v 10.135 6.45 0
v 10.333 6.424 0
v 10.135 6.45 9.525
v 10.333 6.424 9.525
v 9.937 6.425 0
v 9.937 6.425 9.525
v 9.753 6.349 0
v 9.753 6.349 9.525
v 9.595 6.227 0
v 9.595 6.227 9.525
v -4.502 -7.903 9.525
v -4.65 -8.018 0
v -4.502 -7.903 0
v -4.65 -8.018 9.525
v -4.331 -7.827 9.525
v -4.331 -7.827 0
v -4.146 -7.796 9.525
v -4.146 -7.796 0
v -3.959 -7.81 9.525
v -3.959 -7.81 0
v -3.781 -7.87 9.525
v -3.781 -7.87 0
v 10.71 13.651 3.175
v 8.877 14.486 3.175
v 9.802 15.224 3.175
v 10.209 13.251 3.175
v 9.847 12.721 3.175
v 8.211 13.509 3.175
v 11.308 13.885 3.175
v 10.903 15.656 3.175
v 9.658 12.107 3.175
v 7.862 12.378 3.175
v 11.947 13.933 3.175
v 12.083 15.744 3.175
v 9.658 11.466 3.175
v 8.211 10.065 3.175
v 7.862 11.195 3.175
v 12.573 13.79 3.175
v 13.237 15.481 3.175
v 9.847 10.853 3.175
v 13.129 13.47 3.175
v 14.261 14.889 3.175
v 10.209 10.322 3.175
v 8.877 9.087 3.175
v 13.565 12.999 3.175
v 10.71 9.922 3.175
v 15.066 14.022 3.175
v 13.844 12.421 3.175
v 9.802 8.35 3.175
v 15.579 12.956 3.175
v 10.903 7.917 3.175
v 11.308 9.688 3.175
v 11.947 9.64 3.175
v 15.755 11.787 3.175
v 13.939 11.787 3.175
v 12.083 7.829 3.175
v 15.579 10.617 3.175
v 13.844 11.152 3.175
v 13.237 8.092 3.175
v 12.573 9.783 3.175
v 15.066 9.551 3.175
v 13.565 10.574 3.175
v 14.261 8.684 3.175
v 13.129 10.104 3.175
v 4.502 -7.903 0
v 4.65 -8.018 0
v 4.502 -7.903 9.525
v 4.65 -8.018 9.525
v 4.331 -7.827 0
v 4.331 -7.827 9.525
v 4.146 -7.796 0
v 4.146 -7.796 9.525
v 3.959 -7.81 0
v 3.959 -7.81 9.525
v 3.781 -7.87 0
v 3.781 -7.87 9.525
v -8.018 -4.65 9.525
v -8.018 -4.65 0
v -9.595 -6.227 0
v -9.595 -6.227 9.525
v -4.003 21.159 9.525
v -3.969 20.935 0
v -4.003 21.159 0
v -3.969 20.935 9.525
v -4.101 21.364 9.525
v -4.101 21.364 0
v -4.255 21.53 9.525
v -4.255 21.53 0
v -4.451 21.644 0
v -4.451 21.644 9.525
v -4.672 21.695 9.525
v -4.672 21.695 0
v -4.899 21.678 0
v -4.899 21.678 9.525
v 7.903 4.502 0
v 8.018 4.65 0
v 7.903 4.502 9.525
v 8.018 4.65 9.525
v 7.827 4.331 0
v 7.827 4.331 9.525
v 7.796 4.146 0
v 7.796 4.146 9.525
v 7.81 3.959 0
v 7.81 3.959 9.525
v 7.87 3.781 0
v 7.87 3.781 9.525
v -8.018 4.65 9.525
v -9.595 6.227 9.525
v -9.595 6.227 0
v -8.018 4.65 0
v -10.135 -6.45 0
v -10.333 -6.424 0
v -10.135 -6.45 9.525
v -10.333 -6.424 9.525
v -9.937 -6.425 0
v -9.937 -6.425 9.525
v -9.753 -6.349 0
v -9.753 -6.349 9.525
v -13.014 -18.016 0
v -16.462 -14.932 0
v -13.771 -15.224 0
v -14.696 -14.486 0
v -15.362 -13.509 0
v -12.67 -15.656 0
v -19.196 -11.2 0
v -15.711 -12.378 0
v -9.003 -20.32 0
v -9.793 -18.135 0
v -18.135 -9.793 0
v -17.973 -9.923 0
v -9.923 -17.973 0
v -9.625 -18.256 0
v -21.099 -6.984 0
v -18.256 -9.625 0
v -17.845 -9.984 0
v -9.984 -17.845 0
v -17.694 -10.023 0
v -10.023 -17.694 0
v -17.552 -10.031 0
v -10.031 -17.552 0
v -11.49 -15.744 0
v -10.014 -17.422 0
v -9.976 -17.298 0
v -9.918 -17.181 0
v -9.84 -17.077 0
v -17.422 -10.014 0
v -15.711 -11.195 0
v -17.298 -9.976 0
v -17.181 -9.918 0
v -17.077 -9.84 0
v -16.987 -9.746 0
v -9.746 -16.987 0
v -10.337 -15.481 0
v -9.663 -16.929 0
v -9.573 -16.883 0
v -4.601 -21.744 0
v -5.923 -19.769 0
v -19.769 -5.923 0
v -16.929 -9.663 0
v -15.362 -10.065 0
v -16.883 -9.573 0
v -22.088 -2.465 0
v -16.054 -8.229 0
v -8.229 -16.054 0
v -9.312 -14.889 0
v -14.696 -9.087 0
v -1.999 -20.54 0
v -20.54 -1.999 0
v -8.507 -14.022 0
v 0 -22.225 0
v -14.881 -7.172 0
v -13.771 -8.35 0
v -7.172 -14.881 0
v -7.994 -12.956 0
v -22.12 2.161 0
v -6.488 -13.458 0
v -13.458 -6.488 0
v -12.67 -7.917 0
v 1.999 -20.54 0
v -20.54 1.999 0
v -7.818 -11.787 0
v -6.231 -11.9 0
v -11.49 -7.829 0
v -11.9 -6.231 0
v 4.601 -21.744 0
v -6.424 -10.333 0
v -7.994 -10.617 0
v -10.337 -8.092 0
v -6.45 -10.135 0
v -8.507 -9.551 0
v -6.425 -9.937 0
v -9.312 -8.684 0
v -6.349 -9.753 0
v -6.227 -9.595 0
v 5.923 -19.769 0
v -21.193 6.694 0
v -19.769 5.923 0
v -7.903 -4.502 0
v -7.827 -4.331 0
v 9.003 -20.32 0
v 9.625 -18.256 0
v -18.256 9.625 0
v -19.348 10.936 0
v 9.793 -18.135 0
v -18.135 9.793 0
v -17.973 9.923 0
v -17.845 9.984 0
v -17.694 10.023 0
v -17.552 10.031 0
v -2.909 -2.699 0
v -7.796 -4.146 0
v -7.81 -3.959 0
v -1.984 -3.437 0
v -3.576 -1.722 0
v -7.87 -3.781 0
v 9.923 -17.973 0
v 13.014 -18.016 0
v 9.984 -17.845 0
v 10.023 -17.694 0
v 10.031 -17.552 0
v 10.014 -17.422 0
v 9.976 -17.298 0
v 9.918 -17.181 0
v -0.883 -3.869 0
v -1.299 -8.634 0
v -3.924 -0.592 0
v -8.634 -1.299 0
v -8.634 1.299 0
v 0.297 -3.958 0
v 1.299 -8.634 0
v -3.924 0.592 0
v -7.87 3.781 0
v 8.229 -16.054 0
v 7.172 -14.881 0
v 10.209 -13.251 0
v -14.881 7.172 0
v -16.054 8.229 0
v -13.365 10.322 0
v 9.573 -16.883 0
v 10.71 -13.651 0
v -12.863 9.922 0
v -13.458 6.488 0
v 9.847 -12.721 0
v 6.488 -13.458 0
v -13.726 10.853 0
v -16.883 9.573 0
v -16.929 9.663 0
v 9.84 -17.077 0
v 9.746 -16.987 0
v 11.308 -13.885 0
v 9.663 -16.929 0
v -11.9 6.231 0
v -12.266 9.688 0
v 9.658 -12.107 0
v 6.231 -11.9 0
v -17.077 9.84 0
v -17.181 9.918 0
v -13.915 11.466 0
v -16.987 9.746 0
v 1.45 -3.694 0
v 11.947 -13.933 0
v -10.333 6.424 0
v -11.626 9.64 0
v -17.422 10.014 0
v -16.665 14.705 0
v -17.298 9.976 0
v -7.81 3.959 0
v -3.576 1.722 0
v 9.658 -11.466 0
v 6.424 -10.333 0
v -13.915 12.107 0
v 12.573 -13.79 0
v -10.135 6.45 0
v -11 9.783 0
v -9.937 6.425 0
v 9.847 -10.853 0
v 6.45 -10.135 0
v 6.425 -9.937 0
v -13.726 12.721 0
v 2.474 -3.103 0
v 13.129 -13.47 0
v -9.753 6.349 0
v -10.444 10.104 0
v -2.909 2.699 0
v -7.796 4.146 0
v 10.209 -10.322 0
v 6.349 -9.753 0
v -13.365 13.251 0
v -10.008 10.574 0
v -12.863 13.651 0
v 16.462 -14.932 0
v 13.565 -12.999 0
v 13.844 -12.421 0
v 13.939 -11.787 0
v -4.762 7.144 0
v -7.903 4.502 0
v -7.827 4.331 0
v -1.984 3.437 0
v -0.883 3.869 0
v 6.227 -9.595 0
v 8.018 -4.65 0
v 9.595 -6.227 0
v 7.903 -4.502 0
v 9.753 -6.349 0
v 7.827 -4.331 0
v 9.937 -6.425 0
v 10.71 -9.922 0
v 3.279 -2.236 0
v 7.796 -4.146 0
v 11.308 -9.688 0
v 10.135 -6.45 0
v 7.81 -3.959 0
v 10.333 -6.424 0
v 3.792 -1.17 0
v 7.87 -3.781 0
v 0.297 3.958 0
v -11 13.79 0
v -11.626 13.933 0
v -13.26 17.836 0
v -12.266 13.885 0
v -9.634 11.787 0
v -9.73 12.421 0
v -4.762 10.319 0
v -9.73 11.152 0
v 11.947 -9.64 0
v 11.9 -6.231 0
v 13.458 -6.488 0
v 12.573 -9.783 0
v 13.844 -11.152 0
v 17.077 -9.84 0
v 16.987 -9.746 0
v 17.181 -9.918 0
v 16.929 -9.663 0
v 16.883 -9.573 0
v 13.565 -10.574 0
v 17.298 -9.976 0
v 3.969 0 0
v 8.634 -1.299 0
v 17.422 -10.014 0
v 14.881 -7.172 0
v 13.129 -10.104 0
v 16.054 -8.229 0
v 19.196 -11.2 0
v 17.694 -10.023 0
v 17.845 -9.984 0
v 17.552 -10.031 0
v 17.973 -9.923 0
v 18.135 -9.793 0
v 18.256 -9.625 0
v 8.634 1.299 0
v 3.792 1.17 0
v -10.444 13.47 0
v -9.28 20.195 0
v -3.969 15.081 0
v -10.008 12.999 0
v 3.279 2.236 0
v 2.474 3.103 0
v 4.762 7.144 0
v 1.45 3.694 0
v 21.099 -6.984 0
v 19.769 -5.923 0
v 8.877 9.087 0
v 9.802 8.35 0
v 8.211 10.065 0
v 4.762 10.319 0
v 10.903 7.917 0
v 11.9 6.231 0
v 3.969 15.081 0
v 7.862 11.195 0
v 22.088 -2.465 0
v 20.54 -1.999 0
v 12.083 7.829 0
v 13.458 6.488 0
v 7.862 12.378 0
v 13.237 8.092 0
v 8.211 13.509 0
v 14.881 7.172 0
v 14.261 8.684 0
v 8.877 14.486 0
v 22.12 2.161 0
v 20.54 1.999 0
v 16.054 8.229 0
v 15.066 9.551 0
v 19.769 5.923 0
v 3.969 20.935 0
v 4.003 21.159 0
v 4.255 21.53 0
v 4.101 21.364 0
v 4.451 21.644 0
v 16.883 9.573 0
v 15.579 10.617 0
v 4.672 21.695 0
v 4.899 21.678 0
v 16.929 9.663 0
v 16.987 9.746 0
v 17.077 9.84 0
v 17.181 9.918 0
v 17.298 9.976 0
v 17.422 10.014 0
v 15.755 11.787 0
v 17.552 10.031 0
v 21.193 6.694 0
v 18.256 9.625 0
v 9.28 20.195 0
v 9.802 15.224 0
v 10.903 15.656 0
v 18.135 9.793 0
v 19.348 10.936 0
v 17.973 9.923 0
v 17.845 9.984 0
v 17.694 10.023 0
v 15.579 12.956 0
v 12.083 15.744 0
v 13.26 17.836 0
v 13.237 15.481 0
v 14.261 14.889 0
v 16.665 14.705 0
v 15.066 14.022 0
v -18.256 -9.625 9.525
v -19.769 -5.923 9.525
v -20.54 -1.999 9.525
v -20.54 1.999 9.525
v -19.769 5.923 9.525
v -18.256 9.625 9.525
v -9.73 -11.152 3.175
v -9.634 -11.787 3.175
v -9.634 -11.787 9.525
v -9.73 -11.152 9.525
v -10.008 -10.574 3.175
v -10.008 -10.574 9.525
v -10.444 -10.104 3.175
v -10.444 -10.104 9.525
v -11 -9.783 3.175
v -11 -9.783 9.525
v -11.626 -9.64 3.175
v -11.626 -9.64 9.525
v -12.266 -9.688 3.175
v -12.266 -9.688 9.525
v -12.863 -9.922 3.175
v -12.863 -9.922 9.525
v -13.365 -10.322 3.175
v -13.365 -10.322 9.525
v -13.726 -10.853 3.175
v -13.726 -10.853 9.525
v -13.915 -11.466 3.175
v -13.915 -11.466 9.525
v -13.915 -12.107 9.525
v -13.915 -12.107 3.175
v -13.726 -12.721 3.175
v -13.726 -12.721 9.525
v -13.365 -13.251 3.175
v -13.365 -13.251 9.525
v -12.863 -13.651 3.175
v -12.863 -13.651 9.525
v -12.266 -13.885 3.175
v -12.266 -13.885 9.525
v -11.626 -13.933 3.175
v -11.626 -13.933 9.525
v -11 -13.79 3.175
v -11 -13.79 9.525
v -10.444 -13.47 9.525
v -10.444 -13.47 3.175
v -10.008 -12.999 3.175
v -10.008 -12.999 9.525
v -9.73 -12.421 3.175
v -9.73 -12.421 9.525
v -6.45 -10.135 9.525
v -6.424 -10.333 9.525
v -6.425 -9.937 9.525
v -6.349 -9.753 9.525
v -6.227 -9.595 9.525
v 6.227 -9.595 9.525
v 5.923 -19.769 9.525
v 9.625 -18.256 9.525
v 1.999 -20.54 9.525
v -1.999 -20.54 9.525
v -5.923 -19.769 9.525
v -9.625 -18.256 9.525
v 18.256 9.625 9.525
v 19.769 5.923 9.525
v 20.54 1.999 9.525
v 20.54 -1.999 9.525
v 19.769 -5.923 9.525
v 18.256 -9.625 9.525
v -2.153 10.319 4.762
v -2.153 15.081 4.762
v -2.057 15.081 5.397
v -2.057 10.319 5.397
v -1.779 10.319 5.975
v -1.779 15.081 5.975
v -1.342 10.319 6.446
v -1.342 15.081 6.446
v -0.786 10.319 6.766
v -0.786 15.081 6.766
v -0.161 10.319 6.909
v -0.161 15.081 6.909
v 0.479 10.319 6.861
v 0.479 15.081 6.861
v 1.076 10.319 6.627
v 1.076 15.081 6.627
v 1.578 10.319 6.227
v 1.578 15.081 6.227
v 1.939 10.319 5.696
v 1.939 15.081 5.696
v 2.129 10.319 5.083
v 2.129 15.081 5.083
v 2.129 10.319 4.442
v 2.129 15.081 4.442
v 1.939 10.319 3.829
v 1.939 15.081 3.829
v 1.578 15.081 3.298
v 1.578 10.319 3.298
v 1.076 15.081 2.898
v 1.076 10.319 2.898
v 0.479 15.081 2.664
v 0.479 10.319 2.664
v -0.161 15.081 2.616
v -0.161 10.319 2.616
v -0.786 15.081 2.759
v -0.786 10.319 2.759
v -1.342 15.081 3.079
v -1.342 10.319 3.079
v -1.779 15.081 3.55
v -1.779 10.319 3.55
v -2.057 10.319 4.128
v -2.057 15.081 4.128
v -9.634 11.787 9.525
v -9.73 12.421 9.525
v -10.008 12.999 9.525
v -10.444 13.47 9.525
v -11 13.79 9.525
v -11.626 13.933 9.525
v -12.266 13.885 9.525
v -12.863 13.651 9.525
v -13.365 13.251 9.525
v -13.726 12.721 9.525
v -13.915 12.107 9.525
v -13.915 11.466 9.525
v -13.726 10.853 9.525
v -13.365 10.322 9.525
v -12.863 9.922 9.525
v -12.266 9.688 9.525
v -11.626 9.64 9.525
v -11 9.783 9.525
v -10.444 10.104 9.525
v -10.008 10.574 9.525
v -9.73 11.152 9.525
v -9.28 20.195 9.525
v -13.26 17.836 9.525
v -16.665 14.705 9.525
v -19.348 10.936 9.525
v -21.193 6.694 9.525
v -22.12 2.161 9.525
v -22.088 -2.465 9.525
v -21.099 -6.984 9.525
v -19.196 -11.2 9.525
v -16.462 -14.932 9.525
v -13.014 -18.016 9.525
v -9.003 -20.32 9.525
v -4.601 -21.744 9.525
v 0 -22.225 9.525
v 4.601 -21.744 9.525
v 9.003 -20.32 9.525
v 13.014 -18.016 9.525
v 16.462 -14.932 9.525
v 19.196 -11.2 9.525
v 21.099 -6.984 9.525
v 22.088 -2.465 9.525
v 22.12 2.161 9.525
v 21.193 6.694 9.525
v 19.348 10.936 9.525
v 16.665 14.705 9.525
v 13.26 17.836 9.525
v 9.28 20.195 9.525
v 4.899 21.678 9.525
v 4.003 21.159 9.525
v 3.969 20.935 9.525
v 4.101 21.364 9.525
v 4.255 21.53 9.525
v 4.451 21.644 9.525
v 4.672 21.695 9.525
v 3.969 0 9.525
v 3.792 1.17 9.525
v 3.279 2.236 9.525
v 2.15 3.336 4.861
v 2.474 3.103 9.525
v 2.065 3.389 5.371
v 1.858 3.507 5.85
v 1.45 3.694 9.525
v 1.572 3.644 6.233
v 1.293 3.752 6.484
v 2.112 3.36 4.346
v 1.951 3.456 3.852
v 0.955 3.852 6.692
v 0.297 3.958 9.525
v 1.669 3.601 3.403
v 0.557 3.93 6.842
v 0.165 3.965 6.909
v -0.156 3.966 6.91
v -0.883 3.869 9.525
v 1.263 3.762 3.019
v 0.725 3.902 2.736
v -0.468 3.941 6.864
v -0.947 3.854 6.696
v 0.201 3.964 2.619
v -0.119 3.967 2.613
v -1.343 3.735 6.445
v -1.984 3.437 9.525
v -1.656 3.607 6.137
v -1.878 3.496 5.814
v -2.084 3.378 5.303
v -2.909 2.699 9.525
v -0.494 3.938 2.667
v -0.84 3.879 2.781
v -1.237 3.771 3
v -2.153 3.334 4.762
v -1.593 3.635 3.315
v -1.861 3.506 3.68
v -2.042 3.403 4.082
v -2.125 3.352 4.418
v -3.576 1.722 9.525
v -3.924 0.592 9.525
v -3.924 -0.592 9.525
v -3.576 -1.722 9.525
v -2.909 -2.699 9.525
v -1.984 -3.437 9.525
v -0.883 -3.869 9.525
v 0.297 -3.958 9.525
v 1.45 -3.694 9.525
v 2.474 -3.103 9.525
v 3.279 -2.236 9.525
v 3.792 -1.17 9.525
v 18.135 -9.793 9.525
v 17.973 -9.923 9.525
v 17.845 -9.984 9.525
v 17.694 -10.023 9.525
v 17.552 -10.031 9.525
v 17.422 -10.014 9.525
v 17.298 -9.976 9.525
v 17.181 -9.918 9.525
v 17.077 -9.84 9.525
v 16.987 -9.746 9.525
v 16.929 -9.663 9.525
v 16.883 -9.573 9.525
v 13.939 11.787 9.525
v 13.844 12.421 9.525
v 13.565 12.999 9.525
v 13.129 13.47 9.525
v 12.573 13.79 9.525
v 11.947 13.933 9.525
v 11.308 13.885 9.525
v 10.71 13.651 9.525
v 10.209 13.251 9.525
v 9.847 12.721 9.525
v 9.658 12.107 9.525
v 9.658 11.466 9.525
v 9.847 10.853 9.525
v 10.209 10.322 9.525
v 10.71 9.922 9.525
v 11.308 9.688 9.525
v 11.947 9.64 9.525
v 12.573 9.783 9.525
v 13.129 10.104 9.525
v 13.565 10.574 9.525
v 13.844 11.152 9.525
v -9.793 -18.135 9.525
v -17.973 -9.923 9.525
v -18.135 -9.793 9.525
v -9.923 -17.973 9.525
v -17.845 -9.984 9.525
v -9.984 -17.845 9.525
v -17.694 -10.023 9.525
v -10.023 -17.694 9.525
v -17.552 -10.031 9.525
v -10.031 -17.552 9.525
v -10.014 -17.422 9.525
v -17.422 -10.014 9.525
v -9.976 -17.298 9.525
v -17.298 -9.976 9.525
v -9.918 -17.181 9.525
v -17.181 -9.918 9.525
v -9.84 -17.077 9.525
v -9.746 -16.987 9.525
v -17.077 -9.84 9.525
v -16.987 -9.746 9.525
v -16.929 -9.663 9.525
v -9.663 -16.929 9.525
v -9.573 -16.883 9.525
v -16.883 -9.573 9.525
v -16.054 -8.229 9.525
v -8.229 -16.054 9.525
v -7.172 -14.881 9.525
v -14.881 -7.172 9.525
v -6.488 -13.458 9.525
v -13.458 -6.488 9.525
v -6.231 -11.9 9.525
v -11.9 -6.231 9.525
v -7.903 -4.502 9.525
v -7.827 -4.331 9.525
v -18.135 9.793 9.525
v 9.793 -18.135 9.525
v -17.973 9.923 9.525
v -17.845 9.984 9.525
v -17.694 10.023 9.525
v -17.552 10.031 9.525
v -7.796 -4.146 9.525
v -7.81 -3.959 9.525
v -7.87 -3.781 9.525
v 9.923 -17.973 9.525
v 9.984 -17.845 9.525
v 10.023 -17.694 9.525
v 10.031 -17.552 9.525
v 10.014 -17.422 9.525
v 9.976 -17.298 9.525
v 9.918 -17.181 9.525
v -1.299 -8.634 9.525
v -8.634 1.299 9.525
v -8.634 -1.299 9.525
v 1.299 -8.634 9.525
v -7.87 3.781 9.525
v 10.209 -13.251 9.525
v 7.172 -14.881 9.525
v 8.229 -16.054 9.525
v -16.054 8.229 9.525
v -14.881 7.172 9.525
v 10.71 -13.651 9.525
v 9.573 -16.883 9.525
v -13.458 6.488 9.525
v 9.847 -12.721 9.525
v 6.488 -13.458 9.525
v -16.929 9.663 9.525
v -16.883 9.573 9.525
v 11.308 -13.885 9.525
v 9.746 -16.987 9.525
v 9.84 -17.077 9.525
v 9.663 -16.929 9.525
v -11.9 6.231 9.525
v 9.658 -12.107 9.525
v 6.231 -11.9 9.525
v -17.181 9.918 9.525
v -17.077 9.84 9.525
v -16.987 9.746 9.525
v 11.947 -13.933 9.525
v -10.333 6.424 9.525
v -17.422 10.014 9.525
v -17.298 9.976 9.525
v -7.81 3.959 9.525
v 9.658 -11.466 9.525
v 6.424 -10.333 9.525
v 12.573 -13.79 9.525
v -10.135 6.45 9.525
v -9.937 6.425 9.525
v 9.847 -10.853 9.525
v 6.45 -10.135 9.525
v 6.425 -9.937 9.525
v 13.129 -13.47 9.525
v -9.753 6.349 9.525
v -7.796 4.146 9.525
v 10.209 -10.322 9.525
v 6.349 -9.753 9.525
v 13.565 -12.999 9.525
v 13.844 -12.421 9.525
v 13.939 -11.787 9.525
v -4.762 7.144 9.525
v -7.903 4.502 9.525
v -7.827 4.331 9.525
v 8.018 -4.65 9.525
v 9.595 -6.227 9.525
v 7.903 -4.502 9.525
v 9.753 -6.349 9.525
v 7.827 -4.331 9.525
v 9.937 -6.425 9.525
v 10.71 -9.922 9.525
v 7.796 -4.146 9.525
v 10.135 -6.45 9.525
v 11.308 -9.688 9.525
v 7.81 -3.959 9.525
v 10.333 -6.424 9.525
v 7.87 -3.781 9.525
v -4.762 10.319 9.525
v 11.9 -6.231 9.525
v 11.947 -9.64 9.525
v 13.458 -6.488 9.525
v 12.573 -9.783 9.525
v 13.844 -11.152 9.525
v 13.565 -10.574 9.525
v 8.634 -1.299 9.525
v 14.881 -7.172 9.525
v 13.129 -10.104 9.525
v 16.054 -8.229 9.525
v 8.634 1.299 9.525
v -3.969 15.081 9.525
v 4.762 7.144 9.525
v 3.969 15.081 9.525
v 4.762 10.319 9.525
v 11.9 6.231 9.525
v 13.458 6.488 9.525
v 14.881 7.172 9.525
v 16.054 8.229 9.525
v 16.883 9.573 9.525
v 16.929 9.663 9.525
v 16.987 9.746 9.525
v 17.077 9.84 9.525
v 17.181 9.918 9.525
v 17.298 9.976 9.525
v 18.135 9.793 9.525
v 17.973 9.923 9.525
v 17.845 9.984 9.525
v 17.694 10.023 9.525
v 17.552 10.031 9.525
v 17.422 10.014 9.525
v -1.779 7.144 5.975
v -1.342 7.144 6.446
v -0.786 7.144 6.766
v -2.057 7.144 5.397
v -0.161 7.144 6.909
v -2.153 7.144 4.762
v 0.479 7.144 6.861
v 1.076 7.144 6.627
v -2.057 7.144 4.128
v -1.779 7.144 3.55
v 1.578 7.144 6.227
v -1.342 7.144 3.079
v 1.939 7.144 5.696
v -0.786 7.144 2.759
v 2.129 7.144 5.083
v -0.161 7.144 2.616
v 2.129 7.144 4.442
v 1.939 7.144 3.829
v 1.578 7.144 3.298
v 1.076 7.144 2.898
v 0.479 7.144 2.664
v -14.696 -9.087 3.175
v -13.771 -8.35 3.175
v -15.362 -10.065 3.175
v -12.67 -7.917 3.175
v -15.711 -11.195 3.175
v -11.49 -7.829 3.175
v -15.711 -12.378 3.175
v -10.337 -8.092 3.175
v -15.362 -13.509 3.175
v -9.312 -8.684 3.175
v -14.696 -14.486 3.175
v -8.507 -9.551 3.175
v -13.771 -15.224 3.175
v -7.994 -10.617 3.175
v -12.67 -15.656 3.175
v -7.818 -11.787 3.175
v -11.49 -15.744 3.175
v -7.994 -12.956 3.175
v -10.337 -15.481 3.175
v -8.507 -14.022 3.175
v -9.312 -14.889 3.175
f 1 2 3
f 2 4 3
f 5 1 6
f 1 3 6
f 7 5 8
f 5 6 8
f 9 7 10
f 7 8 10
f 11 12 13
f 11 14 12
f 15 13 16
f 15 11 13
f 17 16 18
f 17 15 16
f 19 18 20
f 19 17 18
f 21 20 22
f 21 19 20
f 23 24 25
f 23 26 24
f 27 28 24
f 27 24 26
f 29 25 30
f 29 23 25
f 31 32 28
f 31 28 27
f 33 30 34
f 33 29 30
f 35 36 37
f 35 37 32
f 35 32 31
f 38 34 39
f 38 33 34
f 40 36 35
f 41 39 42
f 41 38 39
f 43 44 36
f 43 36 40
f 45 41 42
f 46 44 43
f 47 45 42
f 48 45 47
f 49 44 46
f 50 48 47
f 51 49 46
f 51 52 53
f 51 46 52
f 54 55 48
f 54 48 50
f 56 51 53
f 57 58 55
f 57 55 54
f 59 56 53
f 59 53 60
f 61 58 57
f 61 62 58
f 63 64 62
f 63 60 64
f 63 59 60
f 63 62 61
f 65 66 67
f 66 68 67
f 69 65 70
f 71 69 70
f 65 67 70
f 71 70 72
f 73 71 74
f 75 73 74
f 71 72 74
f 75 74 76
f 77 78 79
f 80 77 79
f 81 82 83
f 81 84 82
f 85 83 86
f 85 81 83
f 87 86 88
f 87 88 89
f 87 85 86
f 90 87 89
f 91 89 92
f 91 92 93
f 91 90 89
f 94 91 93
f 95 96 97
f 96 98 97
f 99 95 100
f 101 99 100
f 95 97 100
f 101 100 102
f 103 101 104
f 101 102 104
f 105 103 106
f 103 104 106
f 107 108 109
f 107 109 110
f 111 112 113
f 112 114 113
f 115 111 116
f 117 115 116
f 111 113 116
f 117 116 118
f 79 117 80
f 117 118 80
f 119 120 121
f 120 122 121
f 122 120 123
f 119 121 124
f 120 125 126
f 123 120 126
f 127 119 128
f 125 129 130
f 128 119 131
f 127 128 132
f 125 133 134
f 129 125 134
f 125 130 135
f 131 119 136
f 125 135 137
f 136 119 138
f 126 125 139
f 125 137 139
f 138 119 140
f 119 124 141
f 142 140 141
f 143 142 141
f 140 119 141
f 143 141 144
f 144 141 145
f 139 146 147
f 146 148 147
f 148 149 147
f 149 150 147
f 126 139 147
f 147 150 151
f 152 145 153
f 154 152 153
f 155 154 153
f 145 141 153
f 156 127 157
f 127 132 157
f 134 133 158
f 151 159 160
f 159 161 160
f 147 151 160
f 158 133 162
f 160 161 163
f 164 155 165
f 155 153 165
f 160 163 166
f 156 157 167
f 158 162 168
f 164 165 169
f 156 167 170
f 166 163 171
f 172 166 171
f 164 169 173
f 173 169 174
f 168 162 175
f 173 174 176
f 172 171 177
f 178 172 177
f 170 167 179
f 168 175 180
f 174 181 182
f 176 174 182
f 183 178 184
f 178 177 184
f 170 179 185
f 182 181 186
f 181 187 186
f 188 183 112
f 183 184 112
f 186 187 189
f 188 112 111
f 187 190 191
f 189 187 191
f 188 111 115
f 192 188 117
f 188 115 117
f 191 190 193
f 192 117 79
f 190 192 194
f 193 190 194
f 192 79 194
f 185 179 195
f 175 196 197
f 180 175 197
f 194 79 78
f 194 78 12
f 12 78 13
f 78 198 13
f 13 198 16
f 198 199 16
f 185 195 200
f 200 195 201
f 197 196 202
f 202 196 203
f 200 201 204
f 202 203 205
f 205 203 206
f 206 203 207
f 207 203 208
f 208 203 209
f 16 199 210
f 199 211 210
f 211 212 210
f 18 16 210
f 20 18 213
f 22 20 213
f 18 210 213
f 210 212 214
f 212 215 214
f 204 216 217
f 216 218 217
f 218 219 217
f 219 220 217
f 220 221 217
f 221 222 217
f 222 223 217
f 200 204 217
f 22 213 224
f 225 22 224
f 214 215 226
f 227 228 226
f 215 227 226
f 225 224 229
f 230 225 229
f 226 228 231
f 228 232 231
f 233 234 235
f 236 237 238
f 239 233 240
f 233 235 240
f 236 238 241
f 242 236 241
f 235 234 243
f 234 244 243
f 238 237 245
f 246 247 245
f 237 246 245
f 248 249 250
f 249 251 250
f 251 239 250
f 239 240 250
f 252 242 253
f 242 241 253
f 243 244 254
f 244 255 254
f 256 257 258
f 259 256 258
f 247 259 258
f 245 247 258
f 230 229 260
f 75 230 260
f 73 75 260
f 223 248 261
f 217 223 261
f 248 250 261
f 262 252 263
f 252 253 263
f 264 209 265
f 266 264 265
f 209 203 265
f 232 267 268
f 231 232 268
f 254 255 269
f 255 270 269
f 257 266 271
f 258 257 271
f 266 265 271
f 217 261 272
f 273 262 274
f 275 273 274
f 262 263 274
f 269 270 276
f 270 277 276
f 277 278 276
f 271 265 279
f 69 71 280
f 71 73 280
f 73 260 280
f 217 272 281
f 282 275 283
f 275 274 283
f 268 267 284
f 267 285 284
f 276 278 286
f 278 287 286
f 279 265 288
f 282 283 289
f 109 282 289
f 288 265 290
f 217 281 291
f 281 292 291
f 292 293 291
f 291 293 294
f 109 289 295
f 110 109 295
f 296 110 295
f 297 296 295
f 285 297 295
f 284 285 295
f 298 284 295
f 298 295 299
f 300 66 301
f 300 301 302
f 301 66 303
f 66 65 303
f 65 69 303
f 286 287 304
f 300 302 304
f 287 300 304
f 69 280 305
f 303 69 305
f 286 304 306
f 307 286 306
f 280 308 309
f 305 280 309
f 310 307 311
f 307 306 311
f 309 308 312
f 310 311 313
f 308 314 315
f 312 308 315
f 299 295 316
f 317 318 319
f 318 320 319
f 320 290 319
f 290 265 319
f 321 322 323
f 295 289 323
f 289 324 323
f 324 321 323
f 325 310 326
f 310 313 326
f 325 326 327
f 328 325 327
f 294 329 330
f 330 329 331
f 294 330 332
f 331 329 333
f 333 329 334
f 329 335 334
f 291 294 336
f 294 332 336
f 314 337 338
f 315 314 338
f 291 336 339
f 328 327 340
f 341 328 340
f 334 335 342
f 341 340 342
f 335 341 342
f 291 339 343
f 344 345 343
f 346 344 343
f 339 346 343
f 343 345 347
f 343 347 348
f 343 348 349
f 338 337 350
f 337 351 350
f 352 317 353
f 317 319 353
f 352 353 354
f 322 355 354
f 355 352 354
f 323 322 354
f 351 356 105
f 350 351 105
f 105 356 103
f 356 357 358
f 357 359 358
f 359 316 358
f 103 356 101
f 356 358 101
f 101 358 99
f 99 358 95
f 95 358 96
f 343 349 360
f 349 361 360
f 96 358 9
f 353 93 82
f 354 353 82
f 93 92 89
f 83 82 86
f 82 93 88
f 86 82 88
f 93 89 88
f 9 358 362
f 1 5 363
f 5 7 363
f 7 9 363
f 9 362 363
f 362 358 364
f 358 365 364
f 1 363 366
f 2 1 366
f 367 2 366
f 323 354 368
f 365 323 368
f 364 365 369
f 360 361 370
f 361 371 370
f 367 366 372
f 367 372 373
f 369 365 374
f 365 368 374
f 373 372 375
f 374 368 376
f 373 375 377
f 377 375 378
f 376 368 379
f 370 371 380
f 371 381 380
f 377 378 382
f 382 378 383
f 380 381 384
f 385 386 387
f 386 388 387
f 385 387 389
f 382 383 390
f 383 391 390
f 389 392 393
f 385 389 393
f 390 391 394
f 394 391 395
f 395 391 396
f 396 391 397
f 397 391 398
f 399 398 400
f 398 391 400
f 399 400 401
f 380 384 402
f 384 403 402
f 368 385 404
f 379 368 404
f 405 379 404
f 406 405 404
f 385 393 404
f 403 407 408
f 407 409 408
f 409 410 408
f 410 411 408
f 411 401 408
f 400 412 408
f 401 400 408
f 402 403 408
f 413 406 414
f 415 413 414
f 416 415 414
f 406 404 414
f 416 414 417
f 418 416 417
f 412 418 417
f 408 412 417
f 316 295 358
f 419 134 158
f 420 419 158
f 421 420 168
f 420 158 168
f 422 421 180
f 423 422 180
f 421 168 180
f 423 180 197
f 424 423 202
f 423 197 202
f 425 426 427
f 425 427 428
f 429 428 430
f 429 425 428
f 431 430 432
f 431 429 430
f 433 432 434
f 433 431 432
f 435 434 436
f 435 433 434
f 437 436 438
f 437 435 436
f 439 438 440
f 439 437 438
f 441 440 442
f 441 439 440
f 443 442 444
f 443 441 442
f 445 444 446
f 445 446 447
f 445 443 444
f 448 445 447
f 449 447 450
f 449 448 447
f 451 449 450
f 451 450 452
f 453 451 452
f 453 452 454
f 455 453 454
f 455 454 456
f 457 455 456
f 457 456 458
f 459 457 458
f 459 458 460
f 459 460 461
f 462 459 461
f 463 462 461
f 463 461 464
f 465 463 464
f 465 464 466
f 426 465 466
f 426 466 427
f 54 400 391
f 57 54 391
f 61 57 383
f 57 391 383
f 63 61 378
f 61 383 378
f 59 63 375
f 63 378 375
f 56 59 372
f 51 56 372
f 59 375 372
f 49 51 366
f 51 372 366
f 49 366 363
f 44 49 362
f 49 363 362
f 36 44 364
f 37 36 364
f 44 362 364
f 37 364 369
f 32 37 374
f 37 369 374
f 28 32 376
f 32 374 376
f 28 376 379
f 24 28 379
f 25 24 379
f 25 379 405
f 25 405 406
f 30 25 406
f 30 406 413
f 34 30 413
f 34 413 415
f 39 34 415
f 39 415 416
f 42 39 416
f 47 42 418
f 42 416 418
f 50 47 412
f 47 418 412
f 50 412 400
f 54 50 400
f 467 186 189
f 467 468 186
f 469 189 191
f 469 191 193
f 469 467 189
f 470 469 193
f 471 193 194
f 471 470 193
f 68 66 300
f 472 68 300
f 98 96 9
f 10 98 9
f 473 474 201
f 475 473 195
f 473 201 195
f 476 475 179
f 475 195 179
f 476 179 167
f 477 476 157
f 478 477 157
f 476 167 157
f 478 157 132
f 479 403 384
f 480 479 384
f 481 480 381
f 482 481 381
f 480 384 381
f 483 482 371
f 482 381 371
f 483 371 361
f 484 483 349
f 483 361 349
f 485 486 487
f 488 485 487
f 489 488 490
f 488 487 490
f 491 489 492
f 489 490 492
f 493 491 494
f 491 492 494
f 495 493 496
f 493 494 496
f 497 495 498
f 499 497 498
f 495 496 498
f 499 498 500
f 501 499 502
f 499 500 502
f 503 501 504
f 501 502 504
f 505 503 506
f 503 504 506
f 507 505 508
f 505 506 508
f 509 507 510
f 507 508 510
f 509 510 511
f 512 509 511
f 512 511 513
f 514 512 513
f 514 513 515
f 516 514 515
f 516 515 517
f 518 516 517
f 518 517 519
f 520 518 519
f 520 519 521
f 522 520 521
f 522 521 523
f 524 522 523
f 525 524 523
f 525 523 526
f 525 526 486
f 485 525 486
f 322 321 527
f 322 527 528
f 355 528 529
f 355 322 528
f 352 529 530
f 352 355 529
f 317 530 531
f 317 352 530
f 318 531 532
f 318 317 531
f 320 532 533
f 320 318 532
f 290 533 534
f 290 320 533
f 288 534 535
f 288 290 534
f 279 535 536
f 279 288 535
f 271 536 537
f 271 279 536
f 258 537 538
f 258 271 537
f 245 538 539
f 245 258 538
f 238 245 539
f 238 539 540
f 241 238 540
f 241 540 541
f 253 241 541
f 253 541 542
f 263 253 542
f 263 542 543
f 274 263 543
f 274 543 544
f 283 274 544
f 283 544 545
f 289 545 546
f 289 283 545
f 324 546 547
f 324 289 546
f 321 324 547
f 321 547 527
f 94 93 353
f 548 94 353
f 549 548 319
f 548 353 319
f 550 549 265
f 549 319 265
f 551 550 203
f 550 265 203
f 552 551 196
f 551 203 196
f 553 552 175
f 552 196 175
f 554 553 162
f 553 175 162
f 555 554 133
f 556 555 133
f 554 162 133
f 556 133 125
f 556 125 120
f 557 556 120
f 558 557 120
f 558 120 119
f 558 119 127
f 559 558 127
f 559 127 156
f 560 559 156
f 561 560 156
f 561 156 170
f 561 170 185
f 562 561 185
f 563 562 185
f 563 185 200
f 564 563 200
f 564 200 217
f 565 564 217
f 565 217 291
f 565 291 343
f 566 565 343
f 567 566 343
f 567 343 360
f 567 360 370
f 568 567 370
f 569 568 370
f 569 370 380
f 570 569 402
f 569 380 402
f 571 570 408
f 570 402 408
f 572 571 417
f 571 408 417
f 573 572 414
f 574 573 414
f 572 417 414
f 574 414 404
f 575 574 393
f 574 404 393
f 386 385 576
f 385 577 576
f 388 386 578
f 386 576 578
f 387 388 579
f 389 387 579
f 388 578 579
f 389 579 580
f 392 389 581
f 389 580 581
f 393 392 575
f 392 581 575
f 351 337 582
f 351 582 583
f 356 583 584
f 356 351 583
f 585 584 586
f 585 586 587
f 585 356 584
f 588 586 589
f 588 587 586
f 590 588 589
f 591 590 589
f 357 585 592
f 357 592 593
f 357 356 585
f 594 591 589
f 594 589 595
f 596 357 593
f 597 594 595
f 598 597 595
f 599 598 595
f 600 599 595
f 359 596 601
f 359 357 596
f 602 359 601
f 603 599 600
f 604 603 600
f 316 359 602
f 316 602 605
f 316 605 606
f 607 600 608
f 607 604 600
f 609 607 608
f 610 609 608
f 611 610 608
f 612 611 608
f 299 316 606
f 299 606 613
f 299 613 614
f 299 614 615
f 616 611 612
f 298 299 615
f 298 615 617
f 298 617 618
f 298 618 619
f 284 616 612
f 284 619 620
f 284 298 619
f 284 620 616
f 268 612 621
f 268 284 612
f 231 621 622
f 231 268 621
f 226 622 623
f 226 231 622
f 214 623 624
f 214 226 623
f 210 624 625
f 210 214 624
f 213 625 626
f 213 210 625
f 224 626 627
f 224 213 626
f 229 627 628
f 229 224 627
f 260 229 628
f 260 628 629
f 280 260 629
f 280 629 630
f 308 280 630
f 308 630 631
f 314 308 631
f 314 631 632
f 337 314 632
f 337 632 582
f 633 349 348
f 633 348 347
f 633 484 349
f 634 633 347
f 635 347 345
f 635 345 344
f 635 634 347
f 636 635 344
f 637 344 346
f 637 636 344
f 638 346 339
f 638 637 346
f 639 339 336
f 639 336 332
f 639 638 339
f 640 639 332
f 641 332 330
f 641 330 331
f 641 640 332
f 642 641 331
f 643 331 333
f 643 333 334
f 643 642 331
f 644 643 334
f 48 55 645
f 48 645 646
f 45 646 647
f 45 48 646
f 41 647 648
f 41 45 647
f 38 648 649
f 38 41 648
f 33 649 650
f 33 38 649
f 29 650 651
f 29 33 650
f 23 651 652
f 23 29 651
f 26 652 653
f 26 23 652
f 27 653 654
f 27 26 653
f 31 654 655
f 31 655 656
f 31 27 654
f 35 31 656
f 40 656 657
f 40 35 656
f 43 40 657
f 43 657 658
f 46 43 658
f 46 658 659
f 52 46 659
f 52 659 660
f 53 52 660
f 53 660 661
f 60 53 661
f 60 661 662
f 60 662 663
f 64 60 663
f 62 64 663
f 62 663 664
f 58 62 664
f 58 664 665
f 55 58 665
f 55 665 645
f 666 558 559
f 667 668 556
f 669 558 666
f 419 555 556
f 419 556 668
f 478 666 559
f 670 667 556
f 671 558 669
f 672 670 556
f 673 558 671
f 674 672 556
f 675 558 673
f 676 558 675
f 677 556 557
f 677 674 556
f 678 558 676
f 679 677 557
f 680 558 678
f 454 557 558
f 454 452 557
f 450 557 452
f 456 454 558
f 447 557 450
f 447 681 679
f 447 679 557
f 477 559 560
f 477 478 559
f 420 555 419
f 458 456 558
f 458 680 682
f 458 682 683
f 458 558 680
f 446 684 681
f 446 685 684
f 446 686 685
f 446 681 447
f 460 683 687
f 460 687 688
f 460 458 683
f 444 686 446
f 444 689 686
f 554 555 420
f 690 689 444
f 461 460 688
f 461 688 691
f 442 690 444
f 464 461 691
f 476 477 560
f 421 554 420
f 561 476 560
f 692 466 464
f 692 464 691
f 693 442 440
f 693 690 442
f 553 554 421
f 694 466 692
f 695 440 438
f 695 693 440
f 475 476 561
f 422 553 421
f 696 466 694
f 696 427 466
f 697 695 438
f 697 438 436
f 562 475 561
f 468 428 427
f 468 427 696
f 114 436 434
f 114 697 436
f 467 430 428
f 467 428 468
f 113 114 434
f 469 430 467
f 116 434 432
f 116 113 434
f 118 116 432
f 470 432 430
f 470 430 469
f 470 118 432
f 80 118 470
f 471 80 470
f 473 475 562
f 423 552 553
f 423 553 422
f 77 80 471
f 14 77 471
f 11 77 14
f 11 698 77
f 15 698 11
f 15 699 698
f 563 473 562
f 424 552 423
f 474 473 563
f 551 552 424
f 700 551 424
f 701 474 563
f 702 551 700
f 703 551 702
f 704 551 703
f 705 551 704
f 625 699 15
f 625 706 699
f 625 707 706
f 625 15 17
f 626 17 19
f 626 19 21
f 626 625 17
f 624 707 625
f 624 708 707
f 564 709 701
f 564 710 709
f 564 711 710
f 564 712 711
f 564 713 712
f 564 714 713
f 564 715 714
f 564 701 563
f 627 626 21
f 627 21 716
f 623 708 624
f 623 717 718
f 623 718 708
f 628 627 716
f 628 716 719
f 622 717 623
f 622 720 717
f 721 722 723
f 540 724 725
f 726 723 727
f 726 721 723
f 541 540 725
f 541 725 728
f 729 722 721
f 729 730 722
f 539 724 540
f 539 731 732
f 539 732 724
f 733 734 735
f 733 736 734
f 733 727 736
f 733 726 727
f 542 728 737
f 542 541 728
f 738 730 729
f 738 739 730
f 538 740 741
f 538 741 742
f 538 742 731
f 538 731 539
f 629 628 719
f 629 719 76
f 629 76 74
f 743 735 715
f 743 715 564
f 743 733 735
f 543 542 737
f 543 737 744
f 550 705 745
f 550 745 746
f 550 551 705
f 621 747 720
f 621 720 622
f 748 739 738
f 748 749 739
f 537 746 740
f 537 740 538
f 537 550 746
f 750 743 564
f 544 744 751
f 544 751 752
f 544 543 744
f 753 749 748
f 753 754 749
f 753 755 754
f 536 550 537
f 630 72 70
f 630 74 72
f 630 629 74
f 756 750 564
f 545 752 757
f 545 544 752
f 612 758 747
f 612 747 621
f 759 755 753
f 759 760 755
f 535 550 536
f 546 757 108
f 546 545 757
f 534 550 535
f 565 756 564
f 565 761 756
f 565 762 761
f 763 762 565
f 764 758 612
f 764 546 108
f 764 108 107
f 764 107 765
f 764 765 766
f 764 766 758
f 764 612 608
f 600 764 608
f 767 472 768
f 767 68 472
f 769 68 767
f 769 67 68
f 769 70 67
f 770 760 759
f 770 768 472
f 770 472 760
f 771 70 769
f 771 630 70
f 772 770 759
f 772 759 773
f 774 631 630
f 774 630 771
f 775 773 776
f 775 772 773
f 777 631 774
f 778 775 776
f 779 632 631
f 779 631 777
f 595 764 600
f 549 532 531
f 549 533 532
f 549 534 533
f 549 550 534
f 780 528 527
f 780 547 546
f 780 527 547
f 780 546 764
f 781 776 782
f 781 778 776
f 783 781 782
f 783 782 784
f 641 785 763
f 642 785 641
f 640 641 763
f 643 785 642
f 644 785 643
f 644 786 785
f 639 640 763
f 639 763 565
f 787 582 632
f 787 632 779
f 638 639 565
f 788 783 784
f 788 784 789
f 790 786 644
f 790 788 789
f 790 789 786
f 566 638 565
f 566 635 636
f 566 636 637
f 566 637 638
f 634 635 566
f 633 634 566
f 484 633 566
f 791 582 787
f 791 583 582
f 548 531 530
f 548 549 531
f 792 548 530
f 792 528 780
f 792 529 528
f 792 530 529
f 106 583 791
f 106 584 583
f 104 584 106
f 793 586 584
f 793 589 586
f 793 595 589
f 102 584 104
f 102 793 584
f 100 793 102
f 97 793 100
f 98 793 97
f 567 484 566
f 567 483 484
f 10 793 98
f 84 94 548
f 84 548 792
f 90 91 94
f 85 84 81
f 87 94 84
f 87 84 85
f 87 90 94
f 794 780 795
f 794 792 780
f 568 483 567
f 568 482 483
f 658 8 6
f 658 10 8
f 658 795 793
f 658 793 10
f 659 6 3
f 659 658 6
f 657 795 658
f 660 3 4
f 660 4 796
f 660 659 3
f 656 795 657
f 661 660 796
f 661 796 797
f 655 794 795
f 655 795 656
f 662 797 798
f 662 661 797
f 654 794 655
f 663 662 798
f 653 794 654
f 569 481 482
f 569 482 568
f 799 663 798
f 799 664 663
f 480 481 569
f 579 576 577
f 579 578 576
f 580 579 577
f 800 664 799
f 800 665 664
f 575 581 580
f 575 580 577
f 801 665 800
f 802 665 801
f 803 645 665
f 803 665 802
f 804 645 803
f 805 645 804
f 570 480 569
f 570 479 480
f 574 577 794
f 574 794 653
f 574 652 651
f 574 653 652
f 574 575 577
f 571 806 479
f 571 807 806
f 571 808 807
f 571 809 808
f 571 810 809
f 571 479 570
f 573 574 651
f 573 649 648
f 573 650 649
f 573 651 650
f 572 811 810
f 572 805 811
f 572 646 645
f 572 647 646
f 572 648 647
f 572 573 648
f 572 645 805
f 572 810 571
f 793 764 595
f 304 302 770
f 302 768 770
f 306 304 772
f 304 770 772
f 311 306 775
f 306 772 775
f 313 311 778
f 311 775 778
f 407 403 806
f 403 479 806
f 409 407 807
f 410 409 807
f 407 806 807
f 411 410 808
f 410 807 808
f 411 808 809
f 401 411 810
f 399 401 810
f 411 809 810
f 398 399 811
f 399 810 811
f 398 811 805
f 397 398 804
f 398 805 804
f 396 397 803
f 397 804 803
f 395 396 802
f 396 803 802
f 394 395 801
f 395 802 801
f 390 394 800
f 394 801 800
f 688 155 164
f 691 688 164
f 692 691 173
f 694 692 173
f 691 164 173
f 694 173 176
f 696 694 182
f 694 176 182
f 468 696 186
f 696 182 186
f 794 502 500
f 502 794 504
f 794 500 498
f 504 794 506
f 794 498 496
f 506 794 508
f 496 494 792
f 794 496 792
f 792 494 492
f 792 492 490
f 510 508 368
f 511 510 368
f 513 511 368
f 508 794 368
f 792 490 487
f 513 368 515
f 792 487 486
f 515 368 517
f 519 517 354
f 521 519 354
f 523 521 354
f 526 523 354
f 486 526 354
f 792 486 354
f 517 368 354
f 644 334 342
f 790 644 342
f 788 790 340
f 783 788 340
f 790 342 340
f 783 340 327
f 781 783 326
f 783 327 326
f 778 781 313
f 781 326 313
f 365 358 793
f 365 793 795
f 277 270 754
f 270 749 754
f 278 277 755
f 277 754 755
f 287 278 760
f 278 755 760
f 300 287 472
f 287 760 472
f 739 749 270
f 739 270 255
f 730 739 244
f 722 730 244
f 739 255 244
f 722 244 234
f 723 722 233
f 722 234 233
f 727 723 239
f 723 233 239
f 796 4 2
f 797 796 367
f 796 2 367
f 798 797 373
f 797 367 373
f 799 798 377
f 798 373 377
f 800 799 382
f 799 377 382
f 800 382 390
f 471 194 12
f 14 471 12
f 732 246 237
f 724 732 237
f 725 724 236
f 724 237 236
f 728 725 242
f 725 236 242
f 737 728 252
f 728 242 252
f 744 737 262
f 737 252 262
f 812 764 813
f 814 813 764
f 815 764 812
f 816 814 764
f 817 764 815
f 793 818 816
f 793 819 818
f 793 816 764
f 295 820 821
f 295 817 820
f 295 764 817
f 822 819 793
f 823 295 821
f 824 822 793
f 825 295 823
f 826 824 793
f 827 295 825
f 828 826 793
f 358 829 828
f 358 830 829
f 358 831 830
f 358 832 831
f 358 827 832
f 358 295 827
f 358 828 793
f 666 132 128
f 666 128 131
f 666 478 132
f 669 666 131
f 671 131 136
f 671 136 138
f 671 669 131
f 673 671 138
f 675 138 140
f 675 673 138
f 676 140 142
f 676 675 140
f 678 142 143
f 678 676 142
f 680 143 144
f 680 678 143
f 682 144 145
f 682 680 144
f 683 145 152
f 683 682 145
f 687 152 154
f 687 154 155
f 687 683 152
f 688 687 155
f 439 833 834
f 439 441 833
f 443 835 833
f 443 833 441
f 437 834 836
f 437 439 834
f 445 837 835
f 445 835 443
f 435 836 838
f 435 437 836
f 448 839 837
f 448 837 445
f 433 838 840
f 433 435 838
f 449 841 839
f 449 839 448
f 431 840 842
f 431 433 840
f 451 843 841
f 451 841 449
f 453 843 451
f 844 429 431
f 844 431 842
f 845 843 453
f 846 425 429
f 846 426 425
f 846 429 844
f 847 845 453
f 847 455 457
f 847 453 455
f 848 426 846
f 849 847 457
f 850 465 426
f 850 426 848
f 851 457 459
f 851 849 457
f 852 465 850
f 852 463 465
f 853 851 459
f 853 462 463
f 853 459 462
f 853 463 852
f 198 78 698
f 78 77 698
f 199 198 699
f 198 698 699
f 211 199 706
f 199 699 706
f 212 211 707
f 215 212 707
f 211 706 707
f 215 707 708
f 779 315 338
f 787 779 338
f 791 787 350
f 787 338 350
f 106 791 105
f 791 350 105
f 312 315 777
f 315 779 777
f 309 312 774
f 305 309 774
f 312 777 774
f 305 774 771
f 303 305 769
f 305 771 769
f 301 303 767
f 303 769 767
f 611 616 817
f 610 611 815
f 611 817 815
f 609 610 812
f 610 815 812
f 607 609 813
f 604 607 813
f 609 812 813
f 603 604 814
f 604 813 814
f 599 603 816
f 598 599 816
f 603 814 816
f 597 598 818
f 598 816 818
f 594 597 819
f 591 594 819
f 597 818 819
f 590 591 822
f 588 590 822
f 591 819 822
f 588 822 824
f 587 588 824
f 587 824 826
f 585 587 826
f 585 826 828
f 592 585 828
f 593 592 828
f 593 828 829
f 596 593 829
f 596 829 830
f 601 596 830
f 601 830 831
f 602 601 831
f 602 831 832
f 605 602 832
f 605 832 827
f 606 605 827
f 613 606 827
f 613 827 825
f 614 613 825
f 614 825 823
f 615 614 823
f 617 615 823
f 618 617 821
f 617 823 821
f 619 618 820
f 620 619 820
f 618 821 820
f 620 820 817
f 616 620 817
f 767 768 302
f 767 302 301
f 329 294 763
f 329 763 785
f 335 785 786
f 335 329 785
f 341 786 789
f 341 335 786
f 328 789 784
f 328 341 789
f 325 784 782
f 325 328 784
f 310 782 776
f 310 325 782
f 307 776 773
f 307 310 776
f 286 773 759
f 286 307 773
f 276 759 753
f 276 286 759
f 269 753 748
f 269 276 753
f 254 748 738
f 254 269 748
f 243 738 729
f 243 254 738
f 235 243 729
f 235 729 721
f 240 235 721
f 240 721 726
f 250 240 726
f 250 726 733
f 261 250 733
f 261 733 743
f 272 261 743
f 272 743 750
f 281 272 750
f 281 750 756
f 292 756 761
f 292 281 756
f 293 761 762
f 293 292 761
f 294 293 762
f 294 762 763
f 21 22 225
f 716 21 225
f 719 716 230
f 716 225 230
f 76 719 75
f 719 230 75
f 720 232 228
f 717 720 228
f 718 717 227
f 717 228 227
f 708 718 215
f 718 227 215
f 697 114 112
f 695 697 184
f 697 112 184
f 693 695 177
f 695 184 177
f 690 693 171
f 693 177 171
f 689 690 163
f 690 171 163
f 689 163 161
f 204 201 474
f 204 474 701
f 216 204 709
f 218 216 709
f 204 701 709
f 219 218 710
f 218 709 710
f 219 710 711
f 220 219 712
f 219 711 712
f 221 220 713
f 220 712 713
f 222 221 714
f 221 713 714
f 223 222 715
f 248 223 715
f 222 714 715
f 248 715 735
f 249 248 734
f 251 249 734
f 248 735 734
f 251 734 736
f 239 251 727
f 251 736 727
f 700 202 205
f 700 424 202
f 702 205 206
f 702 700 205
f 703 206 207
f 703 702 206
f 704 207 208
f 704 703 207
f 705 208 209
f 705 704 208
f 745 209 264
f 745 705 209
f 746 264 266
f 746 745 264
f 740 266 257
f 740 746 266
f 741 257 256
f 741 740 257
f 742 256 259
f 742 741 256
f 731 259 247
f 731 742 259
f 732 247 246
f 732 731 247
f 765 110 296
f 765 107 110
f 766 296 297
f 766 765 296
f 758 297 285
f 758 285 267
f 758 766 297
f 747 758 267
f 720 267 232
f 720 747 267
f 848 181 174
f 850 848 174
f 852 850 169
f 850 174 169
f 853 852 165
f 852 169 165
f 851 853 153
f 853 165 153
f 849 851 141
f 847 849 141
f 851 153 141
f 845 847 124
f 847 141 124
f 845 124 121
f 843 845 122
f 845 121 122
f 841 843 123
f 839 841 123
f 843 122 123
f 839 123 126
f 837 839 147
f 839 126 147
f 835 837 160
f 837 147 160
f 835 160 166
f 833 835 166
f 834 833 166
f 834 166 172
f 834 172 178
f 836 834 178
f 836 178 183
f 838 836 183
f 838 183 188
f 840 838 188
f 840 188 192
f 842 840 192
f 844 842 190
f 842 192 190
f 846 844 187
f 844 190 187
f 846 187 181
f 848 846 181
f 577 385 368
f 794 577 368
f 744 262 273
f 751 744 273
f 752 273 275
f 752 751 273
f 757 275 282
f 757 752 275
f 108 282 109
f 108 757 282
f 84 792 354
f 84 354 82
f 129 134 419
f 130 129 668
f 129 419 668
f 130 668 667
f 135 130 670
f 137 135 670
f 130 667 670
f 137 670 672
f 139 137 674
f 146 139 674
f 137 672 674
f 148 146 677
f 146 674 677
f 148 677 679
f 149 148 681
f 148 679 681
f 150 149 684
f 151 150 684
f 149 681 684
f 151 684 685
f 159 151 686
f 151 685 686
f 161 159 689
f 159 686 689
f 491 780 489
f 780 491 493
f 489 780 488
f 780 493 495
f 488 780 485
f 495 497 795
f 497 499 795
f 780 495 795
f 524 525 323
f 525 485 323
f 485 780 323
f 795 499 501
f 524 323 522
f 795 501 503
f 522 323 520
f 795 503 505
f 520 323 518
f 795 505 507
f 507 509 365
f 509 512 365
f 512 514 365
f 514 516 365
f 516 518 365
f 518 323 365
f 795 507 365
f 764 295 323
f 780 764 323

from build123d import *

# Parameters (mm, degrees)
F0_R            = 2.15265
F0_R_2          = 3.96875
F0_W            = 9.525
F0_H            = 3.175
F1_DEPTH        = 9.525
F2_R            = 2.15265
F3_REACH        = 43.3958636501
F5_R            = 3.96875
F6_DEPTH        = 3.175
F8_DEPTH        = 9.525
F8_COPIES_COUNT = 3
F8_COPIES_ANGLE = 180
F9_R            = 0.762


# Not quite as in the source:
# - a feature of the source that left no trace in its solid (it failed there, or was rolled back) is left out
# - a pattern or mirror of a feature is missing from the dataset's text; its kind, count and spacing are read off the source's solid


with BuildPart() as f1:
    # F0 (on Top) → F1 (new body)
    with BuildSketch(Plane.XY):
        with BuildLine():
            Line((3.96875, 15.08125), (-3.96875, 15.08125))
            Line((-3.96875, 15.08125), (-3.96875, 21.8677764859))
            ThreePointArc((-3.96875, 21.8677764859), (0, -22.225), (3.96875, 21.8677764859))
            Line((3.96875, 21.8677764859), (3.96875, 15.08125))
        make_face()
        with Locations((-11.7865861589, -11.7865861589)):
            Circle(F0_R, mode=Mode.SUBTRACT)
        with Locations((11.7865861589, -11.7865861589)):
            Circle(F0_R, mode=Mode.SUBTRACT)
        with Locations((-11.7865861589, 11.7865861589)):
            Circle(F0_R, mode=Mode.SUBTRACT)
        Circle(F0_R_2, mode=Mode.SUBTRACT)
        with Locations((0, 8.73125)):
            Rectangle(F0_W, F0_H, mode=Mode.SUBTRACT)
        with Locations((11.7865861589, 11.7865861589)):
            Circle(F0_R, mode=Mode.SUBTRACT)
    extrude(amount=F1_DEPTH)

    f3_end = f1.faces().sort_by_distance((-3.96875, 0, 4.7625))[0]
    # F2 (on face) → F3 (cut, up to a face of the model that its end follows)
    with BuildSketch(Plane(origin=(0, 15.08125, 0), x_dir=(-1, 0, 0), z_dir=(0, 1, 0))):
        with Locations((0, 4.7625)):
            Circle(F2_R)
    f3_long = extrude(amount=-F3_REACH, mode=Mode.PRIVATE)
    add(split(f3_long, bisect_by=f3_end, keep=Keep.ALL, mode=Mode.PRIVATE).solids().sort_by_distance((0, 15.08125, 4.7625))[0], mode=Mode.SUBTRACT)

    # F5 (on face) → F6 (cut, through all)
    with BuildSketch(Plane(origin=(0, 0, 0), x_dir=(1, 0, 0), z_dir=(0, 0, -1))):
        with Locations((11.7865861589, -11.7865861589)):
            Circle(F5_R)
        with Locations((-11.7865861589, 11.7865861589)):
            Circle(F5_R)
    extrude(amount=-F6_DEPTH, mode=Mode.SUBTRACT)

    # F7 (on face) → F8 (cut, through all)
    with BuildSketch(Plane(origin=(0, 0, 0), x_dir=(1, 0, 0), z_dir=(0, 0, -1))):
        with BuildLine():
            ThreePointArc((-17.3148424047, -11.229543123), (-14.7565267097, -7.0906978311), (-9.9206262673, -6.5530302219))
            Line((-9.9206262673, -6.5530302219), (-7.6236791242, -4.2560830788))
            ThreePointArc((-7.6236791242, -4.2560830788), (-8.73125, 0), (-7.6236791242, 4.2560830788))
            Line((-7.6236791242, 4.2560830788), (-9.9206262673, 6.5530302219))
            ThreePointArc((-9.9206262673, 6.5530302219), (-14.7565267097, 7.0906978311), (-17.3148424047, 11.229543123))
            ThreePointArc((-17.3148424047, 11.229543123), (-20.6375, 0), (-17.3148424047, -11.229543123))
        make_face()
    f8 = extrude(amount=-F8_DEPTH, mode=Mode.SUBTRACT)

    # F8_copies: F8 ×3 about axis
    f8_copies_axis = Axis((0, 0, 0), (0, 0, 1))
    for i in range(1, F8_COPIES_COUNT):
        add(f8.rotate(f8_copies_axis, i * F8_COPIES_ANGLE / (F8_COPIES_COUNT - 1)), mode=Mode.SUBTRACT)

    # F9
    f9_edges = [f1.edges().sort_by_distance(p)[0] for p in [
        (-17.314842, -11.229543, 4.7625),
        (-9.920626, -6.55303, 4.7625),
        (-7.623679, -4.256083, 4.7625),
        (-7.623679, 4.256083, 4.7625),
        (-9.920626, 6.55303, 4.7625),
        (-17.314842, 11.229543, 4.7625),
        (3.96875, 21.867776, 4.7625),
        (-3.96875, 21.867776, 4.7625),
        (11.229543, -17.314842, 4.7625),
        (-11.229543, -17.314842, 4.7625),
        (6.55303, -9.920626, 4.7625),
        (-6.55303, -9.920626, 4.7625),
        (4.256083, -7.623679, 4.7625),
        (-4.256083, -7.623679, 4.7625),
        (17.314842, 11.229543, 4.7625),
        (17.314842, -11.229543, 4.7625),
        (9.920626, 6.55303, 4.7625),
        (7.623679, 4.256083, 4.7625),
        (7.623679, -4.256083, 4.7625),
        (9.920626, -6.55303, 4.7625),
    ]]
    fillet(f9_edges, radius=F9_R)


solid = f1.part
